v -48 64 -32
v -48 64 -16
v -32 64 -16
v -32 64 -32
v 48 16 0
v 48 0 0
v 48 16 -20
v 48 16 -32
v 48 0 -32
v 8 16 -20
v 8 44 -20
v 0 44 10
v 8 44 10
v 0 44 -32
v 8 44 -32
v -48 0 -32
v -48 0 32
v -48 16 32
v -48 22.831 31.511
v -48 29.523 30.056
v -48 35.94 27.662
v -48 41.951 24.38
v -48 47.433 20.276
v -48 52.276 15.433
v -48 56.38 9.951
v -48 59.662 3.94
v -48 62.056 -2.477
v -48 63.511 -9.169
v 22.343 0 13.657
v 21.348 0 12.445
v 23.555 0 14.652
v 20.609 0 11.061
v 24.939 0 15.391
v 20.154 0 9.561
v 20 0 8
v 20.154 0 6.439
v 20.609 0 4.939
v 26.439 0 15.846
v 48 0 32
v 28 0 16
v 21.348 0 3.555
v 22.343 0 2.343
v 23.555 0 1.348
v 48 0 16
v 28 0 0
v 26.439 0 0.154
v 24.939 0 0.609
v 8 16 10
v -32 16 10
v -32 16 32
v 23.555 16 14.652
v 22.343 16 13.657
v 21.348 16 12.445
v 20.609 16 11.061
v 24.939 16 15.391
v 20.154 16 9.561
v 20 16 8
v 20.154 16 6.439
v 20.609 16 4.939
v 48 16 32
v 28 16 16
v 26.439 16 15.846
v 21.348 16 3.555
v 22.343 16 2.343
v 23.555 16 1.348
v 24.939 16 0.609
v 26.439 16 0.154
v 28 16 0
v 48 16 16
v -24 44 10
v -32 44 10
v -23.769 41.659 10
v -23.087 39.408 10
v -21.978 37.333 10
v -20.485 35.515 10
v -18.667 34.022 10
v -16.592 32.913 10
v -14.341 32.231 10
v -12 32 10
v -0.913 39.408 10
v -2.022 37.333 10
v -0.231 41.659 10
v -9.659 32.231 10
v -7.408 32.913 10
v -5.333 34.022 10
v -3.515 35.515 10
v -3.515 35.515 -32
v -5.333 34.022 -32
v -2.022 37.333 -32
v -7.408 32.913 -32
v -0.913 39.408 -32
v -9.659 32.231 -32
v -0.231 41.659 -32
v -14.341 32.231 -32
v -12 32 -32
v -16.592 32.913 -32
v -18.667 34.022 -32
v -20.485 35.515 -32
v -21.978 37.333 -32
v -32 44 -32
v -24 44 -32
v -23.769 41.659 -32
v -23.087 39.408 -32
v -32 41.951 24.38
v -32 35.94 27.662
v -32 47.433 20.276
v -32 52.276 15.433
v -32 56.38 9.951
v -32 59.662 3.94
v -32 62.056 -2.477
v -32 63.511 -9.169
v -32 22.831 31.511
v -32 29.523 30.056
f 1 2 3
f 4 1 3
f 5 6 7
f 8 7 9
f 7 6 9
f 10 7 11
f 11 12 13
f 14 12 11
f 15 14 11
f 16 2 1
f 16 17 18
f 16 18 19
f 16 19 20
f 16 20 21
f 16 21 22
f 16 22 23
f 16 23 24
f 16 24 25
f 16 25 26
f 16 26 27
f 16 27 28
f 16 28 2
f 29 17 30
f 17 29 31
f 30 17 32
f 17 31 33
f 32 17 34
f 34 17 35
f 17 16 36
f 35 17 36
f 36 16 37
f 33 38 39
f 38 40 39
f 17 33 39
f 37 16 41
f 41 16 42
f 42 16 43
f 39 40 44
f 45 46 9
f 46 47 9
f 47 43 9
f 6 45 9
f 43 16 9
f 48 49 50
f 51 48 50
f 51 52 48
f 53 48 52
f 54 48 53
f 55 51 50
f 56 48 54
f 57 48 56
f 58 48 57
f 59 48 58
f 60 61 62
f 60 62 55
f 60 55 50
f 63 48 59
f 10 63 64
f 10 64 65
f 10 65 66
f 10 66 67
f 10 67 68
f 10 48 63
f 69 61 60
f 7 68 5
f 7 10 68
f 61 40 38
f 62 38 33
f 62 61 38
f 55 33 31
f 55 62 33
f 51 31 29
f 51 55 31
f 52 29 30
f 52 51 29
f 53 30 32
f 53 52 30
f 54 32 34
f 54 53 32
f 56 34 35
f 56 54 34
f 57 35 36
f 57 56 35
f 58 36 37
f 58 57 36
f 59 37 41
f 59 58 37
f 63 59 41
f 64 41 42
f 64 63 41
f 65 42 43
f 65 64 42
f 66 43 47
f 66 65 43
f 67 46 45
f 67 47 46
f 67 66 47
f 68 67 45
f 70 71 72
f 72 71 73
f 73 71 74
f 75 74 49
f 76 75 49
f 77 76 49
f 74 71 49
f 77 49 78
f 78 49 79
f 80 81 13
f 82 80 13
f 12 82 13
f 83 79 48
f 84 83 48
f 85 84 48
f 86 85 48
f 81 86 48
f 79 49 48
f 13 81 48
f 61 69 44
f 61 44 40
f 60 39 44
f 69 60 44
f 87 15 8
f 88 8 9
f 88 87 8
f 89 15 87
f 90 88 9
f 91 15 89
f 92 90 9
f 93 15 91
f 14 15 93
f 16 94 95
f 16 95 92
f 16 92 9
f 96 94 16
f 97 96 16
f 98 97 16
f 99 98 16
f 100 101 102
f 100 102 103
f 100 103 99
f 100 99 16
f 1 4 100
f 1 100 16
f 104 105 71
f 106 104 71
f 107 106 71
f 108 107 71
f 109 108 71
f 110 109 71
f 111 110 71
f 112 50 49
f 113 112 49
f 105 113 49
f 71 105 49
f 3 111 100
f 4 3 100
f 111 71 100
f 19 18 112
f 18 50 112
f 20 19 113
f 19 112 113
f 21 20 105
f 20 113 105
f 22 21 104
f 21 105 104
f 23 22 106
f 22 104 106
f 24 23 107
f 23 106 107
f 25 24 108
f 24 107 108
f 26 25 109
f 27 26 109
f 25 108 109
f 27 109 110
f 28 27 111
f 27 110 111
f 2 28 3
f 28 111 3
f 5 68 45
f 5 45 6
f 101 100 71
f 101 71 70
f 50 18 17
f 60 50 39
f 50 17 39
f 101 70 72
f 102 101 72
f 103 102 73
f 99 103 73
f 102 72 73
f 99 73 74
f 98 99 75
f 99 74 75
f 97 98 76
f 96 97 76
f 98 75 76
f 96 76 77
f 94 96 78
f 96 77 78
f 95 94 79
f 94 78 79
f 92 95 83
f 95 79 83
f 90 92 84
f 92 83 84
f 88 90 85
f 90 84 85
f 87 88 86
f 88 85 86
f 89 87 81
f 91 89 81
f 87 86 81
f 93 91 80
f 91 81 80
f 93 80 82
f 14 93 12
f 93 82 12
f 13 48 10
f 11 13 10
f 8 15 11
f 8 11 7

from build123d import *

# Parameters (mm, degrees)
SKETCH1_W           = 96
SKETCH1_H           = 64
BOSS_EXTRUDE1_DEPTH = 16
SKETCH2_W           = 16
SKETCH2_H           = 64
BOSS_EXTRUDE2_DEPTH = 48
FILLET3_R           = 48
SKETCH3_W           = 40
SKETCH3_H           = 42
BOSS_EXTRUDE3_DEPTH = 28
SKETCH4_R           = 12
CUT_EXTRUDE1_DEPTH  = 43
BOSS_EXTRUDE4_DEPTH = 12
CUT_EXTRUDE2_DEPTH  = 17


with BuildPart() as part:
    # Sketch1 → Boss-Extrude1 (new body)
    with BuildSketch(Plane(origin=(0, 0, 0), x_dir=(1, 0, 0), z_dir=(0, 1, 0))):
        Rectangle(SKETCH1_W, SKETCH1_H)
    extrude(amount=BOSS_EXTRUDE1_DEPTH)

    # Sketch2 → Boss-Extrude2 (add)
    with BuildSketch(Plane(origin=(0, 16, 0), x_dir=(1, 0, 0), z_dir=(0, 1, 0))):
        with Locations((-40, 0)):
            Rectangle(SKETCH2_W, SKETCH2_H)
    extrude(amount=BOSS_EXTRUDE2_DEPTH)

    # Fillet3
    fillet3_edges = [part.edges().sort_by_distance(p)[0] for p in [
        (-40, 64, 32),
    ]]
    fillet(fillet3_edges, radius=FILLET3_R)

    # Sketch3 → Boss-Extrude3 (add)
    with BuildSketch(Plane(origin=(0, 16, 0), x_dir=(1, 0, 0), z_dir=(0, 1, 0))):
        with Locations((-12, 11)):
            Rectangle(SKETCH3_W, SKETCH3_H)
    extrude(amount=BOSS_EXTRUDE3_DEPTH)

    # Sketch4 → Cut-Extrude1 (cut, through all)
    with BuildSketch(Plane.XY.offset(10)):
        with Locations((-12, 44)):
            Circle(SKETCH4_R)
    extrude(amount=-CUT_EXTRUDE1_DEPTH, mode=Mode.SUBTRACT)

    # Sketch5 → Boss-Extrude4 (add)
    with BuildSketch(Plane(origin=(0, 0, -32), x_dir=(-1, 0, 0), z_dir=(0, 0, -1))):
        Polygon((-8, 16), (-8, 44), (-48, 16), align=None)
    extrude(amount=-BOSS_EXTRUDE4_DEPTH)

    # Sketch6 → Cut-Extrude2 (cut, through all)
    with BuildSketch(Plane(origin=(0, 16, 0), x_dir=(1, 0, 0), z_dir=(0, 1, 0))):
        with BuildLine():
            Line((28, 0), (48, 0))
            ThreePointArc((48, 0), (56, -8), (48, -16))
            Line((48, -16), (28, -16))
            ThreePointArc((28, -16), (20, -8), (28, 0))
        make_face()
    extrude(amount=-CUT_EXTRUDE2_DEPTH, mode=Mode.SUBTRACT)


solid = part.part
